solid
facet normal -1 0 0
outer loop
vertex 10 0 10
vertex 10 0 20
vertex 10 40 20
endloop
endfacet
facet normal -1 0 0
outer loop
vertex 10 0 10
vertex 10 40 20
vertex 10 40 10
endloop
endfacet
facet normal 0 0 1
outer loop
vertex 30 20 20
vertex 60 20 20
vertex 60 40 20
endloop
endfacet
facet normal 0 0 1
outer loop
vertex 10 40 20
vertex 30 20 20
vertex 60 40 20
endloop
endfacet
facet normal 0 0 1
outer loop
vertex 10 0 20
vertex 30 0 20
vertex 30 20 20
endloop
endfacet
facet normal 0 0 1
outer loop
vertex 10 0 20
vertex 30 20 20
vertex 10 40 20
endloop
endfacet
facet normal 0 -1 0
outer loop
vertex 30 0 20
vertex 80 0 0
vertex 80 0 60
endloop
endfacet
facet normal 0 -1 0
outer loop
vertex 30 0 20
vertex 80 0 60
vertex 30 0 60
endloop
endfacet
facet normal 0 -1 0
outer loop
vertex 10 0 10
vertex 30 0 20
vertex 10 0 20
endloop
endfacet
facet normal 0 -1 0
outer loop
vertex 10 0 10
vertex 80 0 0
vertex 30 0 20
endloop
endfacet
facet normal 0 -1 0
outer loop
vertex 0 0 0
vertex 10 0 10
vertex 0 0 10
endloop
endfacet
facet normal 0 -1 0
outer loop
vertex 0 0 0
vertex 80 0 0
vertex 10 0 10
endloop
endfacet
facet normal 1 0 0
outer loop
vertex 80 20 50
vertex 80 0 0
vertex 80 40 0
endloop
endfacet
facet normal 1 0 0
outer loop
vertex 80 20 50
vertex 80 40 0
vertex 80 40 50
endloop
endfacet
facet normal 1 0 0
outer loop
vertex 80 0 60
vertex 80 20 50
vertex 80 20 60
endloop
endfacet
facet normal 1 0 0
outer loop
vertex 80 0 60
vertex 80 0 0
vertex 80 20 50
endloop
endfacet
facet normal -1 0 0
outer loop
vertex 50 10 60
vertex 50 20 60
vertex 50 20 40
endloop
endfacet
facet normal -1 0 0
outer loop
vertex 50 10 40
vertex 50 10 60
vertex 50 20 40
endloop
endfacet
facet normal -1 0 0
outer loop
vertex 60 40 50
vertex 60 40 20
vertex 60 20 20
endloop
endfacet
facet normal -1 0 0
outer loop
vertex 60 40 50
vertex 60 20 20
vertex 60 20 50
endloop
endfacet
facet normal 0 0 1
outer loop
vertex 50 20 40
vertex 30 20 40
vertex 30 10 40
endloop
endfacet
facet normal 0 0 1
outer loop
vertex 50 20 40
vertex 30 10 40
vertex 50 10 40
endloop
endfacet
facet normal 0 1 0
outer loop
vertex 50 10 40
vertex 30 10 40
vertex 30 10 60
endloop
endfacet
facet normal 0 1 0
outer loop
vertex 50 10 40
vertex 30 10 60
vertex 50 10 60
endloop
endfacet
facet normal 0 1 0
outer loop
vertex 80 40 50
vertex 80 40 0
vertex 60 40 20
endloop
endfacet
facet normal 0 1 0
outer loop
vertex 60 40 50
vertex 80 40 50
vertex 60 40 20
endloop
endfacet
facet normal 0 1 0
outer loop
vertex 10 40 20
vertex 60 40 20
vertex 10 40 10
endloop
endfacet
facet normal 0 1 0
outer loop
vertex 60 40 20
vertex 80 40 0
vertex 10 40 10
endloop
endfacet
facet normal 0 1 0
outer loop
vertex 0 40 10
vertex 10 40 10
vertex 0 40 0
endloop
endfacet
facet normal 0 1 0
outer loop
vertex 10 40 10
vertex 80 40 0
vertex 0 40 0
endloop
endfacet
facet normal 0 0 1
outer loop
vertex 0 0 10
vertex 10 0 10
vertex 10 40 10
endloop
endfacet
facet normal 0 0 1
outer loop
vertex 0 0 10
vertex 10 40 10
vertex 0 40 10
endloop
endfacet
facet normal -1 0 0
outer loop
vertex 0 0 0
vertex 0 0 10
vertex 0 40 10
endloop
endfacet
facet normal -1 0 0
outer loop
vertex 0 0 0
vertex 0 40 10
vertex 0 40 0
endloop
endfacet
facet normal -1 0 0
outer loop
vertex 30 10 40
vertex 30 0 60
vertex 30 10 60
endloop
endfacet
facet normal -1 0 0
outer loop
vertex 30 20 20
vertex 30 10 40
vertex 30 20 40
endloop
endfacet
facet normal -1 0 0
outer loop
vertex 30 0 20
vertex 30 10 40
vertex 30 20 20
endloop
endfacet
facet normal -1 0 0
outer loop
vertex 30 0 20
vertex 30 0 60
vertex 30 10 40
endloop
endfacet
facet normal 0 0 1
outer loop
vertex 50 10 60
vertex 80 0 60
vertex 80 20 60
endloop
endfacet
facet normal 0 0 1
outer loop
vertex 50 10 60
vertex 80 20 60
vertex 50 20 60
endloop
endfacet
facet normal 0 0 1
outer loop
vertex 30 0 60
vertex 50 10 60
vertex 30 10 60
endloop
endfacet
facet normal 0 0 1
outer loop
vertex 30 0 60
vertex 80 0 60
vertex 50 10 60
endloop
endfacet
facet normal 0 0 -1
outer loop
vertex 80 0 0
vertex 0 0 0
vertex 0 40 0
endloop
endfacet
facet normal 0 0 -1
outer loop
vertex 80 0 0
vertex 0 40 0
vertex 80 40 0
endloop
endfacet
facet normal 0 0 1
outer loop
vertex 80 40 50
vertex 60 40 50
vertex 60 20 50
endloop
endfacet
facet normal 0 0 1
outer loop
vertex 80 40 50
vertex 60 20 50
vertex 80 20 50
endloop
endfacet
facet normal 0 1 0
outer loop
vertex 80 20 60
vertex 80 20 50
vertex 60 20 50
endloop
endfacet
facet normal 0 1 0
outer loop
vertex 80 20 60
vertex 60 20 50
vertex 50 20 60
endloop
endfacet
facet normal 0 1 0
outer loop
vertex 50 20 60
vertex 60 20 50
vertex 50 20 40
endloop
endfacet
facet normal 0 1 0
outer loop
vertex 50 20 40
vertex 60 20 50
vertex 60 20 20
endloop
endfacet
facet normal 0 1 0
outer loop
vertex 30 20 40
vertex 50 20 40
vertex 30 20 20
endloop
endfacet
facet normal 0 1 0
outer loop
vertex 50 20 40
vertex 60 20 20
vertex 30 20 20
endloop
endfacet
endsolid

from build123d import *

# Parameters (mm, degrees)
BOSS_EXTRUDE2_DEPTH = 40
CUT_EXTRUDE1_DEPTH  = 20
SKETCH4_W           = 20
SKETCH4_H           = 20
CUT_EXTRUDE2_DEPTH  = 10


with BuildPart() as part:
    # Sketch2 → Boss-Extrude2 (new body)
    with BuildSketch(Plane(origin=(0, 0, 0), x_dir=(1, 0, 0), z_dir=(0, 1, 0))):
        Polygon((0, 0), (80, 0), (80, -60), (30, -60), (30, -20), (10, -20), (10, -10), (0, -10), align=None)
    extrude(amount=BOSS_EXTRUDE2_DEPTH)

    # Sketch3 → Cut-Extrude1 (cut)
    with BuildSketch(Plane(origin=(0, 40, 0), x_dir=(1, 0, 0), z_dir=(0, 1, 0))):
        Polygon((80, -52.352661089), (80, -60), (30, -60), (30, -20), (60, -20), (60, -50), (80, -50), align=None)
    extrude(amount=-CUT_EXTRUDE1_DEPTH, mode=Mode.SUBTRACT)

    # Sketch4 → Cut-Extrude2 (cut)
    with BuildSketch(Plane(origin=(0, 20, 0), x_dir=(1, 0, 0), z_dir=(0, 1, 0))):
        with Locations((40, -50)):
            Rectangle(SKETCH4_W, SKETCH4_H)
    extrude(amount=-CUT_EXTRUDE2_DEPTH, mode=Mode.SUBTRACT)


solid = part.part
